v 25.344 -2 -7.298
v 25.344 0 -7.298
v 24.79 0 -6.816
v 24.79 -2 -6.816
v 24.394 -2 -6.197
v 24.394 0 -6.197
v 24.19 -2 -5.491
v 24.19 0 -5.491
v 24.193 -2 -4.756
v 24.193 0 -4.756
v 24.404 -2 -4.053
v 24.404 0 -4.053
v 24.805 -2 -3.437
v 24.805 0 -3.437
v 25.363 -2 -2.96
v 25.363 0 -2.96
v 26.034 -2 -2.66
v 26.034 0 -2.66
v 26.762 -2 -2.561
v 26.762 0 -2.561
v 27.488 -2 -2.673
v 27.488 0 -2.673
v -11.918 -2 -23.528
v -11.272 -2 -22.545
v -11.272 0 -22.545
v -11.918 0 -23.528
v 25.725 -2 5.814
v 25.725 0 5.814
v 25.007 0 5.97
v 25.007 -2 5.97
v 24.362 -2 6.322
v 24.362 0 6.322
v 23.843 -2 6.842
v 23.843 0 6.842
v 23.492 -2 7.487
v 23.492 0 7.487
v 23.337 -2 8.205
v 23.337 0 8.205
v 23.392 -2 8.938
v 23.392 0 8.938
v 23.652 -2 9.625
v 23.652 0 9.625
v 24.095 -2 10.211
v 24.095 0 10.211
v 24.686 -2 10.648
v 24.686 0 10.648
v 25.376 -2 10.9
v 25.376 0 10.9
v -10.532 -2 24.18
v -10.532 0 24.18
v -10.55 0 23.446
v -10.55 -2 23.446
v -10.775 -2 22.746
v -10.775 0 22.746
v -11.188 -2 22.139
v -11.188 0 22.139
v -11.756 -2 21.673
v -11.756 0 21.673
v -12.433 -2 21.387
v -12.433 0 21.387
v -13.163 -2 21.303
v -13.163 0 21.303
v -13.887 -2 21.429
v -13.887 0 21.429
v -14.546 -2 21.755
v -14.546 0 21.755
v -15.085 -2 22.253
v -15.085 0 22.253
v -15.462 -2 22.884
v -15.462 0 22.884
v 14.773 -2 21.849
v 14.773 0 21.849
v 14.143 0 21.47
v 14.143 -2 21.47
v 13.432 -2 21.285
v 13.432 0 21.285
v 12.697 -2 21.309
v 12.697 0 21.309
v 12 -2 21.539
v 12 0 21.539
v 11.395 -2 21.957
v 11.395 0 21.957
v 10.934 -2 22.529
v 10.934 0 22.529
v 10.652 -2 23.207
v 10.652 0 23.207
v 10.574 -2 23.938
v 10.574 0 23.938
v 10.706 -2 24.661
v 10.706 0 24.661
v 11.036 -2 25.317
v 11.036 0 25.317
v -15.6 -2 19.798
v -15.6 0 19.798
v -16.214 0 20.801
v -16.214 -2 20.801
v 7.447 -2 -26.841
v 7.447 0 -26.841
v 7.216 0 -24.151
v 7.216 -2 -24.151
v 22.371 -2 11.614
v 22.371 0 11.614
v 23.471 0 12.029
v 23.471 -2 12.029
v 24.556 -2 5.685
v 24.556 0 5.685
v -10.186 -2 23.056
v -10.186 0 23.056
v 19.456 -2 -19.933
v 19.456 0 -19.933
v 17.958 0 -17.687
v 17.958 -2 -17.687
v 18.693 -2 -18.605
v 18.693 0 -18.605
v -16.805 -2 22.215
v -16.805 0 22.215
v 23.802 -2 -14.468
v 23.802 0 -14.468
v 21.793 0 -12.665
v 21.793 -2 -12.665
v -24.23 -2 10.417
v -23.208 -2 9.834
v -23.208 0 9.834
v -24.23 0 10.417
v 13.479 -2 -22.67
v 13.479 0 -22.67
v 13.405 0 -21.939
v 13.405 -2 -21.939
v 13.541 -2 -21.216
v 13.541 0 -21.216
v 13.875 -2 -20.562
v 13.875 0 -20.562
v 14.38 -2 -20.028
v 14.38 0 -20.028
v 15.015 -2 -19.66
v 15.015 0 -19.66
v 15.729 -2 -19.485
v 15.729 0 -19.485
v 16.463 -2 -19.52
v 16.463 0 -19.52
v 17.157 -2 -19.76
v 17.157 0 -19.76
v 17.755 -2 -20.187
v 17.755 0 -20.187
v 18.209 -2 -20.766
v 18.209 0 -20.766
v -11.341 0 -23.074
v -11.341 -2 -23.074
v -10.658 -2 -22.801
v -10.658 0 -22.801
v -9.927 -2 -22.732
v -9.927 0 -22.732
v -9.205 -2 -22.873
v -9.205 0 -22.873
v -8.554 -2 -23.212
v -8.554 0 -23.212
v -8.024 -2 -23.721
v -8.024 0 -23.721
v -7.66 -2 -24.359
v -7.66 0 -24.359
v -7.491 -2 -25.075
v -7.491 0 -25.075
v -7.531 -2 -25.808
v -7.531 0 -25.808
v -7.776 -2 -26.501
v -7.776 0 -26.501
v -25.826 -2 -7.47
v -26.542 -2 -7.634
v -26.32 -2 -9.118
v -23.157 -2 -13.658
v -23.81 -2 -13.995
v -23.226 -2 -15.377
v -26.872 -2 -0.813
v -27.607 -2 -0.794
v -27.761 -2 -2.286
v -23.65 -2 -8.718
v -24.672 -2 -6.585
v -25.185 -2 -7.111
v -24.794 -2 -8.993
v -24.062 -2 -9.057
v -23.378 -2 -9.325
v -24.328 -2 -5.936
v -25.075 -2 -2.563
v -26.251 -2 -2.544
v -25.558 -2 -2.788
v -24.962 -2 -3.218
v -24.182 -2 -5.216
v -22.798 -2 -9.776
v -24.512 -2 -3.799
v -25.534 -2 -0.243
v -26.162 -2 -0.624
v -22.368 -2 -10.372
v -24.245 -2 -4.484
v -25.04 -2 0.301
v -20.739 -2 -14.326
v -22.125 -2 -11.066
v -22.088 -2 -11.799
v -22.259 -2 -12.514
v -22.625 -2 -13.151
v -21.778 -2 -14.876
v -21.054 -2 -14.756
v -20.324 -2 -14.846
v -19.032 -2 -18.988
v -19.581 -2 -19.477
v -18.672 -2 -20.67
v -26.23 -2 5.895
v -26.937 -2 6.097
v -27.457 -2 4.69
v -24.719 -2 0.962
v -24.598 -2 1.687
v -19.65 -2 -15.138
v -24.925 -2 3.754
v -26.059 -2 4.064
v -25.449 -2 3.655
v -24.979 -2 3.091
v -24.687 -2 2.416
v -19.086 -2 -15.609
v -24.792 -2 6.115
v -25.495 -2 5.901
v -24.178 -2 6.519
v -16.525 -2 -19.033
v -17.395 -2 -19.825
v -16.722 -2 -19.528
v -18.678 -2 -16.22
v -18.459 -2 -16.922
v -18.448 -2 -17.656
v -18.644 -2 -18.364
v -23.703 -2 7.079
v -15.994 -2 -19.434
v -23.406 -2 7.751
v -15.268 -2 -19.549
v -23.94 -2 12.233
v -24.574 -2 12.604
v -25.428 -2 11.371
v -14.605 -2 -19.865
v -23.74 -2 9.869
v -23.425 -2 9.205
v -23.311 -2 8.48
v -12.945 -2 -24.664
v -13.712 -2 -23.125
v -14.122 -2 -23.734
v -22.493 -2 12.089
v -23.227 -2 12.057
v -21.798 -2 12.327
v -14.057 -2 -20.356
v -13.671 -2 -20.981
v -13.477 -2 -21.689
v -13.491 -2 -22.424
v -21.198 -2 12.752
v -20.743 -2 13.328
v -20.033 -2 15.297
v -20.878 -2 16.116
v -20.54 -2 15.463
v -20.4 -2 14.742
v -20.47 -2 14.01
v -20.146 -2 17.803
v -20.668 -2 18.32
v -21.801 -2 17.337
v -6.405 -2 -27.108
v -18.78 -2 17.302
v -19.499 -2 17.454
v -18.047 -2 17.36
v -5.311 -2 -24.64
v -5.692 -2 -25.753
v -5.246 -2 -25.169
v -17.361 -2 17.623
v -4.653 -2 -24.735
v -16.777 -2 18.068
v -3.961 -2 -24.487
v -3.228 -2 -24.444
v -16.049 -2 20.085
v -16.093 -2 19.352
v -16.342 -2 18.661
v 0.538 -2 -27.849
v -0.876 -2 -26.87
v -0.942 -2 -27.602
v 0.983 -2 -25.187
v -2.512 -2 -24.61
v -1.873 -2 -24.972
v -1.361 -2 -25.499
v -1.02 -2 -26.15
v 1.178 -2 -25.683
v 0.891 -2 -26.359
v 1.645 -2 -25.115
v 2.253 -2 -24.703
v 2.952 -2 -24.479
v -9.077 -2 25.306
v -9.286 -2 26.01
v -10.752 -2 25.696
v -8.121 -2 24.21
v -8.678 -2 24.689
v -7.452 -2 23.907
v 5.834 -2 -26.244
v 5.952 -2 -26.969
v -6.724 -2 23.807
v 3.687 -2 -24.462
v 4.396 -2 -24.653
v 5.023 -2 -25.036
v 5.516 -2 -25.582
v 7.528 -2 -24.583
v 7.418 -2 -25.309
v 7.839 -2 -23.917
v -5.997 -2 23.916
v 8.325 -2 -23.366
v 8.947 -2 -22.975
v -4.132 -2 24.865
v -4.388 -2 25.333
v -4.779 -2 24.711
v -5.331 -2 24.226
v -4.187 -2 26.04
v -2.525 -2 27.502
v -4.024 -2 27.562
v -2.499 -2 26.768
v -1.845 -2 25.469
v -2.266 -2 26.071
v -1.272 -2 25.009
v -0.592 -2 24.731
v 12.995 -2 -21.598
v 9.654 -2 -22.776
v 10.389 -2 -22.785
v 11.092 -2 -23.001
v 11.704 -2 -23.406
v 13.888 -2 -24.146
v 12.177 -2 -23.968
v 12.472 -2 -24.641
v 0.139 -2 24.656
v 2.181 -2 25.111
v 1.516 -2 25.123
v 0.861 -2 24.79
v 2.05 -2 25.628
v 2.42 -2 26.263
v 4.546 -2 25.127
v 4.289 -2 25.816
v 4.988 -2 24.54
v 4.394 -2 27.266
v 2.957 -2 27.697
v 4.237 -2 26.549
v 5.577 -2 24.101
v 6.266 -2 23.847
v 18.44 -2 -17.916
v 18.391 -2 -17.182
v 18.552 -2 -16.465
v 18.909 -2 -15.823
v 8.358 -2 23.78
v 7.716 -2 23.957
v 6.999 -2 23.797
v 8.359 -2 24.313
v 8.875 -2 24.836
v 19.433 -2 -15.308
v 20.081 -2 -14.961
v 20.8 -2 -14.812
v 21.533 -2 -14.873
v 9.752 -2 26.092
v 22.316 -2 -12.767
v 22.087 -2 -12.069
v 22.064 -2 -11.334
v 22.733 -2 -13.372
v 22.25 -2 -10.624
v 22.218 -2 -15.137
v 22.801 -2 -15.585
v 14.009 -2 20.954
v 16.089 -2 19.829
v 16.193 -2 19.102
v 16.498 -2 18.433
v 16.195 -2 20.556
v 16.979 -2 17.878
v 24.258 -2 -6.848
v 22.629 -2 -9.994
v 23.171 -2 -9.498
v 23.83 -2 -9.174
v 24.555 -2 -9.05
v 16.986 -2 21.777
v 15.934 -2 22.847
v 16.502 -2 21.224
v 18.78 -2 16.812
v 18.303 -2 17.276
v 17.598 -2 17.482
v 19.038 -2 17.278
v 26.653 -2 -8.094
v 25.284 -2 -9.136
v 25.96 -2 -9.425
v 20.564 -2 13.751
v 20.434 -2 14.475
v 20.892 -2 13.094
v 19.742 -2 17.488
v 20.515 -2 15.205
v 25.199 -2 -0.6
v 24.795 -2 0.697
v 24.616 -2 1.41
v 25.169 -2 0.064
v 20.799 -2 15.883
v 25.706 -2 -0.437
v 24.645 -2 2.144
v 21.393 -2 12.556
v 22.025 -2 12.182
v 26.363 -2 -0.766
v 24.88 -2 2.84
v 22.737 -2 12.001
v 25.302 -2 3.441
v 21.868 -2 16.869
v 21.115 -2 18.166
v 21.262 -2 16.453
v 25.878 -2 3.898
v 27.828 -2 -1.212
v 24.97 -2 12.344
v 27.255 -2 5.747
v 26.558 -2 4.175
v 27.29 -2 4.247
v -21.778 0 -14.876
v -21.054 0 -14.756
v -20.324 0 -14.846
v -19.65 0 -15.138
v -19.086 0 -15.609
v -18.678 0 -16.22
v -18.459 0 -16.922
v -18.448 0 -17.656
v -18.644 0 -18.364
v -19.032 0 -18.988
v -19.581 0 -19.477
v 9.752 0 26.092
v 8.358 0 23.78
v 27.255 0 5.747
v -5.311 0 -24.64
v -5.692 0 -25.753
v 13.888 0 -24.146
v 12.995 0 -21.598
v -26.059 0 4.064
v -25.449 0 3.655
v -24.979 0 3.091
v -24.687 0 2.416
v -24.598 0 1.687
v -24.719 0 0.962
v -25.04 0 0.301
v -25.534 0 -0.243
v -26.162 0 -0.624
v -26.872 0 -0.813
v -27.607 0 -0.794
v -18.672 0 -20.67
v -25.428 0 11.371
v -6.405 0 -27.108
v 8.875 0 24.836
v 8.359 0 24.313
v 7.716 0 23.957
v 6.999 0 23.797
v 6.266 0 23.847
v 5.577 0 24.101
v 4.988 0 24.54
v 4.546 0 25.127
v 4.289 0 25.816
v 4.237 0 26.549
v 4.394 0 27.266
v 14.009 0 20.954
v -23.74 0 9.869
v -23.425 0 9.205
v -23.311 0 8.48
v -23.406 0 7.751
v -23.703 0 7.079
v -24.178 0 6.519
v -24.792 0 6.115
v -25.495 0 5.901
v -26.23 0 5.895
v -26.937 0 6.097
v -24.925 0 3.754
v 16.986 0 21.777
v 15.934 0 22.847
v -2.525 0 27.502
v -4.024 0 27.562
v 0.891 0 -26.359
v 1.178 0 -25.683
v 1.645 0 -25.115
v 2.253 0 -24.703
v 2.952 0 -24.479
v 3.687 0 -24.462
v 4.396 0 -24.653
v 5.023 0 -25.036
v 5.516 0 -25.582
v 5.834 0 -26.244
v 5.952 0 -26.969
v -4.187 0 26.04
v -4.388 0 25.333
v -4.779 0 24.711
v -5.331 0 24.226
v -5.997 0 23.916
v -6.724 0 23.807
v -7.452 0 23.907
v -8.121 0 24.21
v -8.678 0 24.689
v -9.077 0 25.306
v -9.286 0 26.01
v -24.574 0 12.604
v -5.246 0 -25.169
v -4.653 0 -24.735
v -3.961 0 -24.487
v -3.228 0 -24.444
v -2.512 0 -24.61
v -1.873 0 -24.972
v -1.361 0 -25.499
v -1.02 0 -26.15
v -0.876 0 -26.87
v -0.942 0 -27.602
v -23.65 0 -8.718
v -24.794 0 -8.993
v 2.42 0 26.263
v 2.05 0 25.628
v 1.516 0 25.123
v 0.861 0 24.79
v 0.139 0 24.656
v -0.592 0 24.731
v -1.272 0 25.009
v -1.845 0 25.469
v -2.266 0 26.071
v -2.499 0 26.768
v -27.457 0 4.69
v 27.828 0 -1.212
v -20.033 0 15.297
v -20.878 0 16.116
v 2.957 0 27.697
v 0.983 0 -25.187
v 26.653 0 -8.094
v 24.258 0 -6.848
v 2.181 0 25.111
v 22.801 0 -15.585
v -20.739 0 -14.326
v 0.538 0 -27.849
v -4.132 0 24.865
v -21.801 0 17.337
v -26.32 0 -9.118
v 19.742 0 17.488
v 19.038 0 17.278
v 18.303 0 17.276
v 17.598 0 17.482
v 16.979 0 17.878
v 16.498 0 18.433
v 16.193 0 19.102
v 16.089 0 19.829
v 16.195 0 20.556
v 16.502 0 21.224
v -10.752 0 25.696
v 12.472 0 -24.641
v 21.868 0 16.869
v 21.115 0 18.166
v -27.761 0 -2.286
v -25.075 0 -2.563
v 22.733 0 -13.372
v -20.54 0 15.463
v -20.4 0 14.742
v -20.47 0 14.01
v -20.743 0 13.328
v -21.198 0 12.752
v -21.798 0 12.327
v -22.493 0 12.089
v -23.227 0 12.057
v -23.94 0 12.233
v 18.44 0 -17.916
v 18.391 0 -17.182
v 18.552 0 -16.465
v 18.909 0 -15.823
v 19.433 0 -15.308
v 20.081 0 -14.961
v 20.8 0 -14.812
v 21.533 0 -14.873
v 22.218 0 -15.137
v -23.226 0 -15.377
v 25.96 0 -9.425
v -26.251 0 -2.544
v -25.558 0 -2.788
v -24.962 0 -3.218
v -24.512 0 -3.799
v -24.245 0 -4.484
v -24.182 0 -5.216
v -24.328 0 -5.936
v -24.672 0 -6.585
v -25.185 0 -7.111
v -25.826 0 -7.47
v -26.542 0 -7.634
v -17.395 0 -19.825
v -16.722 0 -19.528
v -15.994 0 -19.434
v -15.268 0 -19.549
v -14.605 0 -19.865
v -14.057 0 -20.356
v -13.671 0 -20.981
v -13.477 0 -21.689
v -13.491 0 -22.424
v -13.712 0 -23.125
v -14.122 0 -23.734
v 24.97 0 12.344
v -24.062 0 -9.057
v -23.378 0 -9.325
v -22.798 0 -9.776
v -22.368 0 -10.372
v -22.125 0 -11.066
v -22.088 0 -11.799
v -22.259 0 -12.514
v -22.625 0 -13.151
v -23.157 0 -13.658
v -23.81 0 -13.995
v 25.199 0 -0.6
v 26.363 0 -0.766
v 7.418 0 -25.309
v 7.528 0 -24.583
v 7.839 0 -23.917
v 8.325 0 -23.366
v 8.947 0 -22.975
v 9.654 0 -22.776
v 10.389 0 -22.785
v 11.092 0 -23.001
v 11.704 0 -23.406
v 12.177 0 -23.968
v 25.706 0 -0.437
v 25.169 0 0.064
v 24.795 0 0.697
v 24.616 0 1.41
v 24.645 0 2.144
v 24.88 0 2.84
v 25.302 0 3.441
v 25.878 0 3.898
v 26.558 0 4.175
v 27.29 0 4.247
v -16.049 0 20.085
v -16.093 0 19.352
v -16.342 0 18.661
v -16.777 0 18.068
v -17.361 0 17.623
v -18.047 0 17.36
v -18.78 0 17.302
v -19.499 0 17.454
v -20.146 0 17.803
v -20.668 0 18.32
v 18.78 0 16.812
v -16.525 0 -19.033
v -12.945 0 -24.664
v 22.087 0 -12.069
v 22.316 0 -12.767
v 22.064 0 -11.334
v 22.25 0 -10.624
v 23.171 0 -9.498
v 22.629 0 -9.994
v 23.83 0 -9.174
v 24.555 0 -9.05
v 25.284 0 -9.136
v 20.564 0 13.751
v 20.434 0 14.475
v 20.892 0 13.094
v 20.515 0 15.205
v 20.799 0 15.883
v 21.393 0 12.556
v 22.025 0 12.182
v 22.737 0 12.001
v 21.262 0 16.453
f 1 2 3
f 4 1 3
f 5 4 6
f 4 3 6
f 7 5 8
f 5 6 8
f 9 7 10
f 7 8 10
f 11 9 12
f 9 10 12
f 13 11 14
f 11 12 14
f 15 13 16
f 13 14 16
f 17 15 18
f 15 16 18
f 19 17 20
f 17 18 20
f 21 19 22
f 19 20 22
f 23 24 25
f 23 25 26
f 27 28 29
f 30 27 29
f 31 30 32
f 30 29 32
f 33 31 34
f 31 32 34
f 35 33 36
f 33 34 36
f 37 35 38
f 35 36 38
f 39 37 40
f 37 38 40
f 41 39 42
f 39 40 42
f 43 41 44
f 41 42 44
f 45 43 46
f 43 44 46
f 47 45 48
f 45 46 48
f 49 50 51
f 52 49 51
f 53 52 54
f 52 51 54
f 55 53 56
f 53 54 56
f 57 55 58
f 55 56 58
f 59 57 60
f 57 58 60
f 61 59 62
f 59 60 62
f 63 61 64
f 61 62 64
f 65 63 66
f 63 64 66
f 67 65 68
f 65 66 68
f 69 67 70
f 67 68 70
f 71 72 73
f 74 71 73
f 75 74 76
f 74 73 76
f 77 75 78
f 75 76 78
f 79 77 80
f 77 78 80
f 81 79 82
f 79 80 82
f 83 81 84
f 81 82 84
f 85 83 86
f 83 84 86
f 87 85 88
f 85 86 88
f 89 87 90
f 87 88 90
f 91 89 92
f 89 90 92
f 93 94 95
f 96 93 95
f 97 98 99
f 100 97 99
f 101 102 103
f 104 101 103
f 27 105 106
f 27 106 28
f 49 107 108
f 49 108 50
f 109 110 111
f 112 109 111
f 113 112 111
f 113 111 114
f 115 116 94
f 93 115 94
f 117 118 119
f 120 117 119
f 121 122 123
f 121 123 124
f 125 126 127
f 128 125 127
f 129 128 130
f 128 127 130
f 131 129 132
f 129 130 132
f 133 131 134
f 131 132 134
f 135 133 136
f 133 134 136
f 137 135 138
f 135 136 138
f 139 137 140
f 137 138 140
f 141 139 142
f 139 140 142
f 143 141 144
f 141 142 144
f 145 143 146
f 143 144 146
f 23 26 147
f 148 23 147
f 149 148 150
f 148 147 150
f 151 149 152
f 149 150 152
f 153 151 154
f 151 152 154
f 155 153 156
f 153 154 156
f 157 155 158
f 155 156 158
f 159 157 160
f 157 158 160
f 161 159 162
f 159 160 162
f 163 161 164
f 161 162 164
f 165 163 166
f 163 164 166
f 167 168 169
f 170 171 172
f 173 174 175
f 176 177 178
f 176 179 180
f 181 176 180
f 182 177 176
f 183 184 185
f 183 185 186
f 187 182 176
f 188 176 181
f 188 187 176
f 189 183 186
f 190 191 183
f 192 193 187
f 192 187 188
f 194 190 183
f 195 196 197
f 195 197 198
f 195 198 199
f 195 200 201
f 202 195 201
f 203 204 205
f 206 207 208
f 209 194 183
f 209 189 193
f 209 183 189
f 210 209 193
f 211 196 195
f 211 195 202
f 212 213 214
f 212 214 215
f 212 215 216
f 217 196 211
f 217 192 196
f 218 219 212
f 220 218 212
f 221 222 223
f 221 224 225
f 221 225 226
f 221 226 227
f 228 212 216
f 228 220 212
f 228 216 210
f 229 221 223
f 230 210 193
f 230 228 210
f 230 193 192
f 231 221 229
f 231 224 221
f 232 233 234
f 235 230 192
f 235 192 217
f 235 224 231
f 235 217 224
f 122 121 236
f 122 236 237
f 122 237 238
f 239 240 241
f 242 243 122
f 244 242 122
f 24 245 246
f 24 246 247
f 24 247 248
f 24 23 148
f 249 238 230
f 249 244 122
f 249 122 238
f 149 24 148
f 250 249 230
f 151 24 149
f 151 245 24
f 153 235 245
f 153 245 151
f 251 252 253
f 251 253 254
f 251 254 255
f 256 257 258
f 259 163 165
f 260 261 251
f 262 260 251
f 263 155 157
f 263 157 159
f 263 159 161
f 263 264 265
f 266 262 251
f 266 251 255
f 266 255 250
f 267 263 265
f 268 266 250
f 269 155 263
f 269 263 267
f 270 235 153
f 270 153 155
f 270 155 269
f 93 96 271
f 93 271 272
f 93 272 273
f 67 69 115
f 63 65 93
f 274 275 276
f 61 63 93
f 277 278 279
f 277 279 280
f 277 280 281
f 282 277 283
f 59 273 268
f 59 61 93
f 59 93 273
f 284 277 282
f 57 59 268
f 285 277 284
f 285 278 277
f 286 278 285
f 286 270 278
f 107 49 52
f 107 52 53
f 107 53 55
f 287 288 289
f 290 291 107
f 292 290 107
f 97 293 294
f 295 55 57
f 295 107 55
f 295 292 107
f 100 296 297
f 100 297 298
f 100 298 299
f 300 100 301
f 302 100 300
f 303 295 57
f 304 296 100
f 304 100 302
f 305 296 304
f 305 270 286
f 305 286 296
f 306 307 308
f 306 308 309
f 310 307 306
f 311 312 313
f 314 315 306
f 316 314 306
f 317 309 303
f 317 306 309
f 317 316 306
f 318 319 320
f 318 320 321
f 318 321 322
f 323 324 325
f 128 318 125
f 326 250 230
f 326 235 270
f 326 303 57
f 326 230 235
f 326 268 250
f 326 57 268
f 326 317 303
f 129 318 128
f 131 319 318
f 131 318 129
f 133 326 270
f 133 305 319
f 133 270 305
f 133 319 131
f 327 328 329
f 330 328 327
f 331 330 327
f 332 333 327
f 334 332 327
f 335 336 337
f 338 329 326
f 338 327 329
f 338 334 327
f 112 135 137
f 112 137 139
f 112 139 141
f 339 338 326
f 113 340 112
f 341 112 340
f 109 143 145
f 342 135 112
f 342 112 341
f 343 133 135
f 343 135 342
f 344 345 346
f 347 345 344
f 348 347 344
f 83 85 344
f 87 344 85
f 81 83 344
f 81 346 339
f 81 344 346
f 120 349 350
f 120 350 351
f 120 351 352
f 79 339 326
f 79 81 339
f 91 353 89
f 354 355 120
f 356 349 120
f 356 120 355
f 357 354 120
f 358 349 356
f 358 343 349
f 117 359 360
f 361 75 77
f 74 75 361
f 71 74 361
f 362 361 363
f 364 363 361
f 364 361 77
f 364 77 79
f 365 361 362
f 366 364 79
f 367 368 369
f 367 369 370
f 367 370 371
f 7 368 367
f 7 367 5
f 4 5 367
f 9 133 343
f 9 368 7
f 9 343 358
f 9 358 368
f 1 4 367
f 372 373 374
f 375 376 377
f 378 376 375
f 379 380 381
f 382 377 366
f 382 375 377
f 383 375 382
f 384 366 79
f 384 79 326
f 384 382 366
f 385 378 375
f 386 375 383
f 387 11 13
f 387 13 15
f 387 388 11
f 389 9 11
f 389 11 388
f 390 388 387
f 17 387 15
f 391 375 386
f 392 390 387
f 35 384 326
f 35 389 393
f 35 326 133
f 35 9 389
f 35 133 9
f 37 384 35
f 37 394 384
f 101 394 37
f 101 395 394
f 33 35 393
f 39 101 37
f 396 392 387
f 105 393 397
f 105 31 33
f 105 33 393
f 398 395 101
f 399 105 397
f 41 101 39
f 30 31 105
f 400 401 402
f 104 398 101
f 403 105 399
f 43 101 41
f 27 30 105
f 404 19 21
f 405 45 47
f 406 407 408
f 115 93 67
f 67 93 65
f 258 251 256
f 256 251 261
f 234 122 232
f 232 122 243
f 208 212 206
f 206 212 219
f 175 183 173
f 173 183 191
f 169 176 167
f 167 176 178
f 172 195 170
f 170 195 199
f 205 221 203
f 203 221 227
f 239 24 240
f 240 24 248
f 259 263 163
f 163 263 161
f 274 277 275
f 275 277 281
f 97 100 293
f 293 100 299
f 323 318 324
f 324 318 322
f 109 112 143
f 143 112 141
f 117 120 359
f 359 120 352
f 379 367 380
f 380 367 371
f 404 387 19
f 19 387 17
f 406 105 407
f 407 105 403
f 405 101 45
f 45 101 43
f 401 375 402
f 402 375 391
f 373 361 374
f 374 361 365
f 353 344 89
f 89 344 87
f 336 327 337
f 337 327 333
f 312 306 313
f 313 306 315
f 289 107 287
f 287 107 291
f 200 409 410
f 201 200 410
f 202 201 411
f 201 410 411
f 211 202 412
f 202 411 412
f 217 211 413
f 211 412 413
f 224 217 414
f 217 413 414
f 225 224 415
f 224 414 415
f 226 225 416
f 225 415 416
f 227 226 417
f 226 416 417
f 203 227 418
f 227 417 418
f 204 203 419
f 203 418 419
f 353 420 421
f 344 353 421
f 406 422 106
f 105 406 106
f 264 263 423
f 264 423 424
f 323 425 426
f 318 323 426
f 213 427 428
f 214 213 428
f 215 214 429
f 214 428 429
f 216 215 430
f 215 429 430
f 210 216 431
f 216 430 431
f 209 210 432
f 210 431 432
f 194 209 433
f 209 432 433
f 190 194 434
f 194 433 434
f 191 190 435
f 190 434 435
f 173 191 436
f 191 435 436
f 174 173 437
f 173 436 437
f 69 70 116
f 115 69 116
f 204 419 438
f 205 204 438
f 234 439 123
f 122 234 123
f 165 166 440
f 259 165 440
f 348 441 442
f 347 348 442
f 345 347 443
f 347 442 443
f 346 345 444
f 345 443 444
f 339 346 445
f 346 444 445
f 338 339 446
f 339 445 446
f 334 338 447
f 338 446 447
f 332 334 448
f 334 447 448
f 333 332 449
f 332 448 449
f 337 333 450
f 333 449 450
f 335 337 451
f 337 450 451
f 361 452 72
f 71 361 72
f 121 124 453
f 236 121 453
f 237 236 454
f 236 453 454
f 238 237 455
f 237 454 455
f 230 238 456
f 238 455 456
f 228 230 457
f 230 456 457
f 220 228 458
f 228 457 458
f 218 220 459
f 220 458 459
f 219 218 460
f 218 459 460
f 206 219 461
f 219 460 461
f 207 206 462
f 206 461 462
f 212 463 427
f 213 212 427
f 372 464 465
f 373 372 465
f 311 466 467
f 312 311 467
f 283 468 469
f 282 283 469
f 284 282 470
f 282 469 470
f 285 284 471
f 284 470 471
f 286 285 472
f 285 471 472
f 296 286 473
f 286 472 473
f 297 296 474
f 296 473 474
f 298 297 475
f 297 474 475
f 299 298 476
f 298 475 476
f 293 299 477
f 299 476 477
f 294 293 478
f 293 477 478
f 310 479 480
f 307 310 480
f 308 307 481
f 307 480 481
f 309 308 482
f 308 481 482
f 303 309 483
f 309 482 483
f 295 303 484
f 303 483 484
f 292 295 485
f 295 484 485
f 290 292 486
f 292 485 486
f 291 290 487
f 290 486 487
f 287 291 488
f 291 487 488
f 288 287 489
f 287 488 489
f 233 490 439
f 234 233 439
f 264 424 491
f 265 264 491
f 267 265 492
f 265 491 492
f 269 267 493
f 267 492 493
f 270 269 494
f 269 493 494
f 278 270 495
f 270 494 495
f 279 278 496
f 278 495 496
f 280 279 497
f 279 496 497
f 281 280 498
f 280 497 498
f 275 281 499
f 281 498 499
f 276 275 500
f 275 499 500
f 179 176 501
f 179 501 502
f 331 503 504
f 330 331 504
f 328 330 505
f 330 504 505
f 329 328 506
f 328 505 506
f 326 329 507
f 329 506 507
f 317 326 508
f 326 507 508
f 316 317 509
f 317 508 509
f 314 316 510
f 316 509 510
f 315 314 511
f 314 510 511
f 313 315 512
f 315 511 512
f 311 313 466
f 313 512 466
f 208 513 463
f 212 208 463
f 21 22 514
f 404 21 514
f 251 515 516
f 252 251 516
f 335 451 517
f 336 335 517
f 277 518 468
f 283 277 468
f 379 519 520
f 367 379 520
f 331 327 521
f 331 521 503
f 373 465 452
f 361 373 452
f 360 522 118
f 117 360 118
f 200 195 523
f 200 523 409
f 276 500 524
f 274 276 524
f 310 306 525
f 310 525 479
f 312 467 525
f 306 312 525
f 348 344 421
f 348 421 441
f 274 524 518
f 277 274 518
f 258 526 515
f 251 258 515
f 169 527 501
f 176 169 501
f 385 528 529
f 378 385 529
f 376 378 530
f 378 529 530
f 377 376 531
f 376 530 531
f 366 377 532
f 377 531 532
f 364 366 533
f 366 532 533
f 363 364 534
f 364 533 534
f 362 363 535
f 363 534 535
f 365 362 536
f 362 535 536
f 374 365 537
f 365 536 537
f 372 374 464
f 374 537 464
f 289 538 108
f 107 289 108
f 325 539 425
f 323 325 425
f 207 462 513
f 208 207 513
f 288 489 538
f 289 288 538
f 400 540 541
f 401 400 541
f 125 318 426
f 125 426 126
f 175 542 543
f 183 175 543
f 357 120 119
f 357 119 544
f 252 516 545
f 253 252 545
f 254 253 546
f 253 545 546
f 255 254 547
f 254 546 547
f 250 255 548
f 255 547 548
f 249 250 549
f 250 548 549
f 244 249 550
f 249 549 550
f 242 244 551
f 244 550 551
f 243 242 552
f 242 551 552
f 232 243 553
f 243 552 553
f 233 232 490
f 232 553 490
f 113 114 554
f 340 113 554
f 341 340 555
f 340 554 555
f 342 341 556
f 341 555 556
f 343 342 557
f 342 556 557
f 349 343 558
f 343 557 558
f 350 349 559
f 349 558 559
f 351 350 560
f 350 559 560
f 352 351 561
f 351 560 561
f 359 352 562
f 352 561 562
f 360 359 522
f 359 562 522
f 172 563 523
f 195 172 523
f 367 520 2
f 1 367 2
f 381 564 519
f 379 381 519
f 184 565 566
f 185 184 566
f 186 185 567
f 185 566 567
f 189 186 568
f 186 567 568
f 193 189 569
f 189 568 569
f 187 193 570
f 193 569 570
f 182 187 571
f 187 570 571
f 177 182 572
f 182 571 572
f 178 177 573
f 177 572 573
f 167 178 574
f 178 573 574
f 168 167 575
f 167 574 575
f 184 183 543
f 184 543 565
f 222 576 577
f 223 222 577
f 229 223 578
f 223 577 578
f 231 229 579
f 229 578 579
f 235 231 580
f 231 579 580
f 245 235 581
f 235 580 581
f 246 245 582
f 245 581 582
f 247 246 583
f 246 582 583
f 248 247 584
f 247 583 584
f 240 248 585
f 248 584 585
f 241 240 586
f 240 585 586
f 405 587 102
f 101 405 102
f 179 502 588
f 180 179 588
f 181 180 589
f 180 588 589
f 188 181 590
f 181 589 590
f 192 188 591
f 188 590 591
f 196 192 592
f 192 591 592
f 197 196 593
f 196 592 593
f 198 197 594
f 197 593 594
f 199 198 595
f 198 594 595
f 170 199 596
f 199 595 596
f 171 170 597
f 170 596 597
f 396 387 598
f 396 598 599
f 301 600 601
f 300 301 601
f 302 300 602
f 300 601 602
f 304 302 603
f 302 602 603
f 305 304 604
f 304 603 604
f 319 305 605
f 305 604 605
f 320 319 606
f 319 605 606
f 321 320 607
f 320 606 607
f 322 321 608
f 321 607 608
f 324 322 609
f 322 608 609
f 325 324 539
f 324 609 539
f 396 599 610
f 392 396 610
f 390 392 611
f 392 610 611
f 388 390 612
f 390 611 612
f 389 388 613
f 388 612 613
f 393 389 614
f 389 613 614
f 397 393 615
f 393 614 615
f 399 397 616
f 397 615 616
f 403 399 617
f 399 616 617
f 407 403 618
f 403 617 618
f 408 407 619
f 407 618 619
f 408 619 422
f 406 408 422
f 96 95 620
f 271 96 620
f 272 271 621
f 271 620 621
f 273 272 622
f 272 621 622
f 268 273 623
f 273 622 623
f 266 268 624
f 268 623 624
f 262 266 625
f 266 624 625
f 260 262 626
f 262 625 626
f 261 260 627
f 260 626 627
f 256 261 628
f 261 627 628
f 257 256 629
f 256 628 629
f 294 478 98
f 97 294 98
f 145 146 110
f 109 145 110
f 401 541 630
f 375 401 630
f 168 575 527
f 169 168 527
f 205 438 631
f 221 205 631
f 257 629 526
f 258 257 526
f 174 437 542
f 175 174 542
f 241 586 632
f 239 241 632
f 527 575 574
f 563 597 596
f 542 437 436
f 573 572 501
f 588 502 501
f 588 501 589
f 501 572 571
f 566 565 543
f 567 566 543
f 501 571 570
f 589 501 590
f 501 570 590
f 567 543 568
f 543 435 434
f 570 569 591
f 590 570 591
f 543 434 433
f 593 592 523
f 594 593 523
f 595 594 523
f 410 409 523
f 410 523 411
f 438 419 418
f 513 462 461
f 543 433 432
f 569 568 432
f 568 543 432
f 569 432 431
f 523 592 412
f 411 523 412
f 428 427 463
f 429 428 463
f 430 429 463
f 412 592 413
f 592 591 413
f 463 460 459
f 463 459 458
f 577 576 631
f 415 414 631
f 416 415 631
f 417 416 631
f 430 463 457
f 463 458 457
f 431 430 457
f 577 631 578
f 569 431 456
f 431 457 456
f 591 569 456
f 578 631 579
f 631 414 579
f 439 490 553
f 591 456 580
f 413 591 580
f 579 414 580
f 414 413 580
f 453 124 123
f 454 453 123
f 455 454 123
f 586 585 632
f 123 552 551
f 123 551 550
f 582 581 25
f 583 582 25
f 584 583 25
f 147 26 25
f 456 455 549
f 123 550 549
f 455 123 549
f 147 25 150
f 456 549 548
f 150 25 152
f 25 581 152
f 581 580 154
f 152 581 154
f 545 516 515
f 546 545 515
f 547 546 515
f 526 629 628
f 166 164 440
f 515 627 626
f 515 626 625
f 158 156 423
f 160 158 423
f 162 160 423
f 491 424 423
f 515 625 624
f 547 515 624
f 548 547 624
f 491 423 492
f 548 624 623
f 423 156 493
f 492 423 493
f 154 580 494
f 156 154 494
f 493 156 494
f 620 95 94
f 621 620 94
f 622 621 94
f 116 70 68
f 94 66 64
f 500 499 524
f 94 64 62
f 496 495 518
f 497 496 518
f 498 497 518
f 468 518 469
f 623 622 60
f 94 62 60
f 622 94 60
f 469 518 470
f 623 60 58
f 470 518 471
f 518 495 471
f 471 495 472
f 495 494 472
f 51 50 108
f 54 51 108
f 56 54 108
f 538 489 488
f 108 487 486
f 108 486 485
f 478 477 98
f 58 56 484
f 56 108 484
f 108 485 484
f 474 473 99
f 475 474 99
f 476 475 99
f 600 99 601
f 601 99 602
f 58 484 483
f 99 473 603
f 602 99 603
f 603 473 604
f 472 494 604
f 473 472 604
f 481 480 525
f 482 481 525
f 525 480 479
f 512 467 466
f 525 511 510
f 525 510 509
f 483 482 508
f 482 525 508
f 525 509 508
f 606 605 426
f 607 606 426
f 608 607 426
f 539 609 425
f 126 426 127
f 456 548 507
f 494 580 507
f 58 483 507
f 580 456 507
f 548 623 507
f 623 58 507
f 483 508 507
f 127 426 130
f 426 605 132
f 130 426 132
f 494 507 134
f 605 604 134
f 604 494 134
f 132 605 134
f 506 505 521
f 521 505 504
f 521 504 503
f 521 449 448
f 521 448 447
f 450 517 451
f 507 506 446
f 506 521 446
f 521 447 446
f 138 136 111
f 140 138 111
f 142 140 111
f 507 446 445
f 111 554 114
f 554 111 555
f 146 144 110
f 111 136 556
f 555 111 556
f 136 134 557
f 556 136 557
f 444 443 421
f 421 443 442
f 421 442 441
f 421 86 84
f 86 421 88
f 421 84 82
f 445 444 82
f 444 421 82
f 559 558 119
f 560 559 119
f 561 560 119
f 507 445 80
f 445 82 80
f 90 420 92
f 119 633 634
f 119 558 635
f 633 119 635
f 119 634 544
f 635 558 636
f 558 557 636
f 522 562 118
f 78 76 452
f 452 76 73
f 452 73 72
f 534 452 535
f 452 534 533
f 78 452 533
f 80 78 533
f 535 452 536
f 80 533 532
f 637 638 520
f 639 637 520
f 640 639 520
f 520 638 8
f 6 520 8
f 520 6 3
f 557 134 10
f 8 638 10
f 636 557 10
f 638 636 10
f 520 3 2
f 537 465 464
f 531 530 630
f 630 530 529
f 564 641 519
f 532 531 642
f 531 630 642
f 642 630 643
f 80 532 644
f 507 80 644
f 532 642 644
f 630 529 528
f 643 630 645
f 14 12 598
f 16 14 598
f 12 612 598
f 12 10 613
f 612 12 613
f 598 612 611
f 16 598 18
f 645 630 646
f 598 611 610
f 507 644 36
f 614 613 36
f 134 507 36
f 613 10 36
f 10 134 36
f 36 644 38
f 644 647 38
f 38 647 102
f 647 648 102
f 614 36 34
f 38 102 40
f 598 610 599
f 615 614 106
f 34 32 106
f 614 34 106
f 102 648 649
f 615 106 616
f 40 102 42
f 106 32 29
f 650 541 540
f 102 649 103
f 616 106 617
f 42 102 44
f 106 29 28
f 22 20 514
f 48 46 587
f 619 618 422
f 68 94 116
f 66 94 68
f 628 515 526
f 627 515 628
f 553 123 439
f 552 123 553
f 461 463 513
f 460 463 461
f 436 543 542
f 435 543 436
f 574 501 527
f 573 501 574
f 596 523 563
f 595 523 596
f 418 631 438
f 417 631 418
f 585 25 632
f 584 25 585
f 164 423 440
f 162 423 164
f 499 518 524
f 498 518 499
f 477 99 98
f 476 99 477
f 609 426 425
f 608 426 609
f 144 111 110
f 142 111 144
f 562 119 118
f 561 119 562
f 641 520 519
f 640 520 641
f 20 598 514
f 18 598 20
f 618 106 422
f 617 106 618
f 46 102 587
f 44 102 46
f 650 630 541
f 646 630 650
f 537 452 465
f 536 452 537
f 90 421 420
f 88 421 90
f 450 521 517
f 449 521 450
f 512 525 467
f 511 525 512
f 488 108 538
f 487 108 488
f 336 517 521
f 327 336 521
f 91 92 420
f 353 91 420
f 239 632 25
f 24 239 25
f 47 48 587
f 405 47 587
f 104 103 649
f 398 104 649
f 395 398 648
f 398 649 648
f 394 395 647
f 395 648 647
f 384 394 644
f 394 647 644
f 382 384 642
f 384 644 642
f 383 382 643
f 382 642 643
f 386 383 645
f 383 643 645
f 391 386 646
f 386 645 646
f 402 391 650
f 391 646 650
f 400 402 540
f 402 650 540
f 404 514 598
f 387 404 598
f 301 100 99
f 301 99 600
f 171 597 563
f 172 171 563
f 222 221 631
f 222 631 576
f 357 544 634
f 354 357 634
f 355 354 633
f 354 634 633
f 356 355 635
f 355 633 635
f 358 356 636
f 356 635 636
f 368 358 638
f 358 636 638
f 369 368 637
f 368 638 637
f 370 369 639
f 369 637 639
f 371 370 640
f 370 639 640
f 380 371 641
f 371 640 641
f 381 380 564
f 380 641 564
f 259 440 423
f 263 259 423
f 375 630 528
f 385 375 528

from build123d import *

# Parameters (mm, degrees)
F1_DEPTH = 2
F2_COUNT = 25
F3_DEPTH = 2
F0_R     = 1.3791907975
F4_R     = 24.1789897238
F5_DEPTH = 2


with BuildPart() as f1:
    # F0 (on Front) → F1 (new body)
    with BuildSketch(Plane.XZ):
        with BuildLine():
            ThreePointArc((-20.8778160203, 16.1155972919), (-21.1981117968, 12.751512491), (-24.5742007448, 12.6042734059))
            Line((-24.5742007448, 12.6042734059), (-25.4280168593, 11.3709859121))
            Line((-25.4280168593, 11.3709859121), (-22.1392502091, 9.0941429398))
            Line((-22.1392502091, 9.0941429398), (-18.7239857507, 14.0272929152))
            Line((-18.7239857507, 14.0272929152), (-20.8778160203, 16.1155972919))
        make_face()
    extrude(amount=F1_DEPTH)


with BuildPart() as f2_1:
    # F2: instance of F1
    add(f1.part.rotate(Axis((0, 0, 0), (0, -1, 0)), 1 * 360 / F2_COUNT))


with BuildPart() as f2_2:
    # F2: instance of F1
    add(f1.part.rotate(Axis((0, 0, 0), (0, -1, 0)), 2 * 360 / F2_COUNT))


with BuildPart() as f2_3:
    # F2: instance of F1
    add(f1.part.rotate(Axis((0, 0, 0), (0, -1, 0)), 3 * 360 / F2_COUNT))


with BuildPart() as f2_4:
    # F2: instance of F1
    add(f1.part.rotate(Axis((0, 0, 0), (0, -1, 0)), 4 * 360 / F2_COUNT))


with BuildPart() as f2_5:
    # F2: instance of F1
    add(f1.part.rotate(Axis((0, 0, 0), (0, -1, 0)), 5 * 360 / F2_COUNT))


with BuildPart() as f2_6:
    # F2: instance of F1
    add(f1.part.rotate(Axis((0, 0, 0), (0, -1, 0)), 6 * 360 / F2_COUNT))


with BuildPart() as f2_7:
    # F2: instance of F1
    add(f1.part.rotate(Axis((0, 0, 0), (0, -1, 0)), 7 * 360 / F2_COUNT))


with BuildPart() as f2_8:
    # F2: instance of F1
    add(f1.part.rotate(Axis((0, 0, 0), (0, -1, 0)), 8 * 360 / F2_COUNT))


with BuildPart() as f2_9:
    # F2: instance of F1
    add(f1.part.rotate(Axis((0, 0, 0), (0, -1, 0)), 9 * 360 / F2_COUNT))


with BuildPart() as f2_10:
    # F2: instance of F1
    add(f1.part.rotate(Axis((0, 0, 0), (0, -1, 0)), 10 * 360 / F2_COUNT))


with BuildPart() as f2_11:
    # F2: instance of F1
    add(f1.part.rotate(Axis((0, 0, 0), (0, -1, 0)), 11 * 360 / F2_COUNT))


with BuildPart() as f2_12:
    # F2: instance of F1
    add(f1.part.rotate(Axis((0, 0, 0), (0, -1, 0)), 12 * 360 / F2_COUNT))


with BuildPart() as f2_13:
    # F2: instance of F1
    add(f1.part.rotate(Axis((0, 0, 0), (0, -1, 0)), 13 * 360 / F2_COUNT))


with BuildPart() as f2_14:
    # F2: instance of F1
    add(f1.part.rotate(Axis((0, 0, 0), (0, -1, 0)), 14 * 360 / F2_COUNT))


with BuildPart() as f2_15:
    # F2: instance of F1
    add(f1.part.rotate(Axis((0, 0, 0), (0, -1, 0)), 15 * 360 / F2_COUNT))


with BuildPart() as f2_16:
    # F2: instance of F1
    add(f1.part.rotate(Axis((0, 0, 0), (0, -1, 0)), 16 * 360 / F2_COUNT))


with BuildPart() as f2_17:
    # F2: instance of F1
    add(f1.part.rotate(Axis((0, 0, 0), (0, -1, 0)), 17 * 360 / F2_COUNT))


with BuildPart() as f2_18:
    # F2: instance of F1
    add(f1.part.rotate(Axis((0, 0, 0), (0, -1, 0)), 18 * 360 / F2_COUNT))


with BuildPart() as f2_19:
    # F2: instance of F1
    add(f1.part.rotate(Axis((0, 0, 0), (0, -1, 0)), 19 * 360 / F2_COUNT))


with BuildPart() as f2_20:
    # F2: instance of F1
    add(f1.part.rotate(Axis((0, 0, 0), (0, -1, 0)), 20 * 360 / F2_COUNT))


with BuildPart() as f2_21:
    # F2: instance of F1
    add(f1.part.rotate(Axis((0, 0, 0), (0, -1, 0)), 21 * 360 / F2_COUNT))


with BuildPart() as f2_22:
    # F2: instance of F1
    add(f1.part.rotate(Axis((0, 0, 0), (0, -1, 0)), 22 * 360 / F2_COUNT))


with BuildPart() as f2_23:
    # F2: instance of F1
    add(f1.part.rotate(Axis((0, 0, 0), (0, -1, 0)), 23 * 360 / F2_COUNT))


with BuildPart() as f2_24:
    # F2: instance of F1
    add(f1.part.rotate(Axis((0, 0, 0), (0, -1, 0)), 24 * 360 / F2_COUNT))


with BuildPart() as f1_1:
    add(f1.part)

    add(f2_1.part)  # F3 merges F2_1

    add(f2_24.part)  # F3 merges F2_24
    # F0 (on Front) → F3 (join)
    with BuildSketch(Plane.XZ):
        with BuildLine():
            ThreePointArc((-20.8778160203, 16.1155972919), (-21.1981117968, 12.751512491), (-24.5742007448, 12.6042734059))
            Line((-24.5742007448, 12.6042734059), (-25.4280168593, 11.3709859121))
            Line((-25.4280168593, 11.3709859121), (-22.1392502091, 9.0941429398))
            Line((-22.1392502091, 9.0941429398), (-18.7239857507, 14.0272929152))
            Line((-18.7239857507, 14.0272929152), (-20.8778160203, 16.1155972919))
        make_face()
    extrude(amount=F3_DEPTH)

    add(f2_2.part)  # F5 merges F2_2

    add(f2_3.part)  # F5 merges F2_3

    add(f2_4.part)  # F5 merges F2_4

    add(f2_5.part)  # F5 merges F2_5

    add(f2_6.part)  # F5 merges F2_6

    add(f2_7.part)  # F5 merges F2_7

    add(f2_8.part)  # F5 merges F2_8

    add(f2_9.part)  # F5 merges F2_9

    add(f2_10.part)  # F5 merges F2_10

    add(f2_11.part)  # F5 merges F2_11

    add(f2_12.part)  # F5 merges F2_12

    add(f2_13.part)  # F5 merges F2_13

    add(f2_14.part)  # F5 merges F2_14

    add(f2_15.part)  # F5 merges F2_15

    add(f2_16.part)  # F5 merges F2_16

    add(f2_17.part)  # F5 merges F2_17

    add(f2_18.part)  # F5 merges F2_18

    add(f2_19.part)  # F5 merges F2_19

    add(f2_20.part)  # F5 merges F2_20

    add(f2_21.part)  # F5 merges F2_21

    add(f2_22.part)  # F5 merges F2_22

    add(f2_23.part)  # F5 merges F2_23


with BuildPart() as f3:
    # F0 (on Front) → F3, piece 2 (new body)
    with BuildSketch(Plane.XZ):
        Circle(F0_R)
    extrude(amount=F3_DEPTH)


with BuildPart() as f1_2:
    add(f1_1.part)

    add(f3.part)  # F5 merges F3
    # F4 (on Front) → F5 (join)
    with BuildSketch(Plane.XZ):
        Circle(F4_R)
    extrude(amount=F5_DEPTH)


solid = f1_2.part
